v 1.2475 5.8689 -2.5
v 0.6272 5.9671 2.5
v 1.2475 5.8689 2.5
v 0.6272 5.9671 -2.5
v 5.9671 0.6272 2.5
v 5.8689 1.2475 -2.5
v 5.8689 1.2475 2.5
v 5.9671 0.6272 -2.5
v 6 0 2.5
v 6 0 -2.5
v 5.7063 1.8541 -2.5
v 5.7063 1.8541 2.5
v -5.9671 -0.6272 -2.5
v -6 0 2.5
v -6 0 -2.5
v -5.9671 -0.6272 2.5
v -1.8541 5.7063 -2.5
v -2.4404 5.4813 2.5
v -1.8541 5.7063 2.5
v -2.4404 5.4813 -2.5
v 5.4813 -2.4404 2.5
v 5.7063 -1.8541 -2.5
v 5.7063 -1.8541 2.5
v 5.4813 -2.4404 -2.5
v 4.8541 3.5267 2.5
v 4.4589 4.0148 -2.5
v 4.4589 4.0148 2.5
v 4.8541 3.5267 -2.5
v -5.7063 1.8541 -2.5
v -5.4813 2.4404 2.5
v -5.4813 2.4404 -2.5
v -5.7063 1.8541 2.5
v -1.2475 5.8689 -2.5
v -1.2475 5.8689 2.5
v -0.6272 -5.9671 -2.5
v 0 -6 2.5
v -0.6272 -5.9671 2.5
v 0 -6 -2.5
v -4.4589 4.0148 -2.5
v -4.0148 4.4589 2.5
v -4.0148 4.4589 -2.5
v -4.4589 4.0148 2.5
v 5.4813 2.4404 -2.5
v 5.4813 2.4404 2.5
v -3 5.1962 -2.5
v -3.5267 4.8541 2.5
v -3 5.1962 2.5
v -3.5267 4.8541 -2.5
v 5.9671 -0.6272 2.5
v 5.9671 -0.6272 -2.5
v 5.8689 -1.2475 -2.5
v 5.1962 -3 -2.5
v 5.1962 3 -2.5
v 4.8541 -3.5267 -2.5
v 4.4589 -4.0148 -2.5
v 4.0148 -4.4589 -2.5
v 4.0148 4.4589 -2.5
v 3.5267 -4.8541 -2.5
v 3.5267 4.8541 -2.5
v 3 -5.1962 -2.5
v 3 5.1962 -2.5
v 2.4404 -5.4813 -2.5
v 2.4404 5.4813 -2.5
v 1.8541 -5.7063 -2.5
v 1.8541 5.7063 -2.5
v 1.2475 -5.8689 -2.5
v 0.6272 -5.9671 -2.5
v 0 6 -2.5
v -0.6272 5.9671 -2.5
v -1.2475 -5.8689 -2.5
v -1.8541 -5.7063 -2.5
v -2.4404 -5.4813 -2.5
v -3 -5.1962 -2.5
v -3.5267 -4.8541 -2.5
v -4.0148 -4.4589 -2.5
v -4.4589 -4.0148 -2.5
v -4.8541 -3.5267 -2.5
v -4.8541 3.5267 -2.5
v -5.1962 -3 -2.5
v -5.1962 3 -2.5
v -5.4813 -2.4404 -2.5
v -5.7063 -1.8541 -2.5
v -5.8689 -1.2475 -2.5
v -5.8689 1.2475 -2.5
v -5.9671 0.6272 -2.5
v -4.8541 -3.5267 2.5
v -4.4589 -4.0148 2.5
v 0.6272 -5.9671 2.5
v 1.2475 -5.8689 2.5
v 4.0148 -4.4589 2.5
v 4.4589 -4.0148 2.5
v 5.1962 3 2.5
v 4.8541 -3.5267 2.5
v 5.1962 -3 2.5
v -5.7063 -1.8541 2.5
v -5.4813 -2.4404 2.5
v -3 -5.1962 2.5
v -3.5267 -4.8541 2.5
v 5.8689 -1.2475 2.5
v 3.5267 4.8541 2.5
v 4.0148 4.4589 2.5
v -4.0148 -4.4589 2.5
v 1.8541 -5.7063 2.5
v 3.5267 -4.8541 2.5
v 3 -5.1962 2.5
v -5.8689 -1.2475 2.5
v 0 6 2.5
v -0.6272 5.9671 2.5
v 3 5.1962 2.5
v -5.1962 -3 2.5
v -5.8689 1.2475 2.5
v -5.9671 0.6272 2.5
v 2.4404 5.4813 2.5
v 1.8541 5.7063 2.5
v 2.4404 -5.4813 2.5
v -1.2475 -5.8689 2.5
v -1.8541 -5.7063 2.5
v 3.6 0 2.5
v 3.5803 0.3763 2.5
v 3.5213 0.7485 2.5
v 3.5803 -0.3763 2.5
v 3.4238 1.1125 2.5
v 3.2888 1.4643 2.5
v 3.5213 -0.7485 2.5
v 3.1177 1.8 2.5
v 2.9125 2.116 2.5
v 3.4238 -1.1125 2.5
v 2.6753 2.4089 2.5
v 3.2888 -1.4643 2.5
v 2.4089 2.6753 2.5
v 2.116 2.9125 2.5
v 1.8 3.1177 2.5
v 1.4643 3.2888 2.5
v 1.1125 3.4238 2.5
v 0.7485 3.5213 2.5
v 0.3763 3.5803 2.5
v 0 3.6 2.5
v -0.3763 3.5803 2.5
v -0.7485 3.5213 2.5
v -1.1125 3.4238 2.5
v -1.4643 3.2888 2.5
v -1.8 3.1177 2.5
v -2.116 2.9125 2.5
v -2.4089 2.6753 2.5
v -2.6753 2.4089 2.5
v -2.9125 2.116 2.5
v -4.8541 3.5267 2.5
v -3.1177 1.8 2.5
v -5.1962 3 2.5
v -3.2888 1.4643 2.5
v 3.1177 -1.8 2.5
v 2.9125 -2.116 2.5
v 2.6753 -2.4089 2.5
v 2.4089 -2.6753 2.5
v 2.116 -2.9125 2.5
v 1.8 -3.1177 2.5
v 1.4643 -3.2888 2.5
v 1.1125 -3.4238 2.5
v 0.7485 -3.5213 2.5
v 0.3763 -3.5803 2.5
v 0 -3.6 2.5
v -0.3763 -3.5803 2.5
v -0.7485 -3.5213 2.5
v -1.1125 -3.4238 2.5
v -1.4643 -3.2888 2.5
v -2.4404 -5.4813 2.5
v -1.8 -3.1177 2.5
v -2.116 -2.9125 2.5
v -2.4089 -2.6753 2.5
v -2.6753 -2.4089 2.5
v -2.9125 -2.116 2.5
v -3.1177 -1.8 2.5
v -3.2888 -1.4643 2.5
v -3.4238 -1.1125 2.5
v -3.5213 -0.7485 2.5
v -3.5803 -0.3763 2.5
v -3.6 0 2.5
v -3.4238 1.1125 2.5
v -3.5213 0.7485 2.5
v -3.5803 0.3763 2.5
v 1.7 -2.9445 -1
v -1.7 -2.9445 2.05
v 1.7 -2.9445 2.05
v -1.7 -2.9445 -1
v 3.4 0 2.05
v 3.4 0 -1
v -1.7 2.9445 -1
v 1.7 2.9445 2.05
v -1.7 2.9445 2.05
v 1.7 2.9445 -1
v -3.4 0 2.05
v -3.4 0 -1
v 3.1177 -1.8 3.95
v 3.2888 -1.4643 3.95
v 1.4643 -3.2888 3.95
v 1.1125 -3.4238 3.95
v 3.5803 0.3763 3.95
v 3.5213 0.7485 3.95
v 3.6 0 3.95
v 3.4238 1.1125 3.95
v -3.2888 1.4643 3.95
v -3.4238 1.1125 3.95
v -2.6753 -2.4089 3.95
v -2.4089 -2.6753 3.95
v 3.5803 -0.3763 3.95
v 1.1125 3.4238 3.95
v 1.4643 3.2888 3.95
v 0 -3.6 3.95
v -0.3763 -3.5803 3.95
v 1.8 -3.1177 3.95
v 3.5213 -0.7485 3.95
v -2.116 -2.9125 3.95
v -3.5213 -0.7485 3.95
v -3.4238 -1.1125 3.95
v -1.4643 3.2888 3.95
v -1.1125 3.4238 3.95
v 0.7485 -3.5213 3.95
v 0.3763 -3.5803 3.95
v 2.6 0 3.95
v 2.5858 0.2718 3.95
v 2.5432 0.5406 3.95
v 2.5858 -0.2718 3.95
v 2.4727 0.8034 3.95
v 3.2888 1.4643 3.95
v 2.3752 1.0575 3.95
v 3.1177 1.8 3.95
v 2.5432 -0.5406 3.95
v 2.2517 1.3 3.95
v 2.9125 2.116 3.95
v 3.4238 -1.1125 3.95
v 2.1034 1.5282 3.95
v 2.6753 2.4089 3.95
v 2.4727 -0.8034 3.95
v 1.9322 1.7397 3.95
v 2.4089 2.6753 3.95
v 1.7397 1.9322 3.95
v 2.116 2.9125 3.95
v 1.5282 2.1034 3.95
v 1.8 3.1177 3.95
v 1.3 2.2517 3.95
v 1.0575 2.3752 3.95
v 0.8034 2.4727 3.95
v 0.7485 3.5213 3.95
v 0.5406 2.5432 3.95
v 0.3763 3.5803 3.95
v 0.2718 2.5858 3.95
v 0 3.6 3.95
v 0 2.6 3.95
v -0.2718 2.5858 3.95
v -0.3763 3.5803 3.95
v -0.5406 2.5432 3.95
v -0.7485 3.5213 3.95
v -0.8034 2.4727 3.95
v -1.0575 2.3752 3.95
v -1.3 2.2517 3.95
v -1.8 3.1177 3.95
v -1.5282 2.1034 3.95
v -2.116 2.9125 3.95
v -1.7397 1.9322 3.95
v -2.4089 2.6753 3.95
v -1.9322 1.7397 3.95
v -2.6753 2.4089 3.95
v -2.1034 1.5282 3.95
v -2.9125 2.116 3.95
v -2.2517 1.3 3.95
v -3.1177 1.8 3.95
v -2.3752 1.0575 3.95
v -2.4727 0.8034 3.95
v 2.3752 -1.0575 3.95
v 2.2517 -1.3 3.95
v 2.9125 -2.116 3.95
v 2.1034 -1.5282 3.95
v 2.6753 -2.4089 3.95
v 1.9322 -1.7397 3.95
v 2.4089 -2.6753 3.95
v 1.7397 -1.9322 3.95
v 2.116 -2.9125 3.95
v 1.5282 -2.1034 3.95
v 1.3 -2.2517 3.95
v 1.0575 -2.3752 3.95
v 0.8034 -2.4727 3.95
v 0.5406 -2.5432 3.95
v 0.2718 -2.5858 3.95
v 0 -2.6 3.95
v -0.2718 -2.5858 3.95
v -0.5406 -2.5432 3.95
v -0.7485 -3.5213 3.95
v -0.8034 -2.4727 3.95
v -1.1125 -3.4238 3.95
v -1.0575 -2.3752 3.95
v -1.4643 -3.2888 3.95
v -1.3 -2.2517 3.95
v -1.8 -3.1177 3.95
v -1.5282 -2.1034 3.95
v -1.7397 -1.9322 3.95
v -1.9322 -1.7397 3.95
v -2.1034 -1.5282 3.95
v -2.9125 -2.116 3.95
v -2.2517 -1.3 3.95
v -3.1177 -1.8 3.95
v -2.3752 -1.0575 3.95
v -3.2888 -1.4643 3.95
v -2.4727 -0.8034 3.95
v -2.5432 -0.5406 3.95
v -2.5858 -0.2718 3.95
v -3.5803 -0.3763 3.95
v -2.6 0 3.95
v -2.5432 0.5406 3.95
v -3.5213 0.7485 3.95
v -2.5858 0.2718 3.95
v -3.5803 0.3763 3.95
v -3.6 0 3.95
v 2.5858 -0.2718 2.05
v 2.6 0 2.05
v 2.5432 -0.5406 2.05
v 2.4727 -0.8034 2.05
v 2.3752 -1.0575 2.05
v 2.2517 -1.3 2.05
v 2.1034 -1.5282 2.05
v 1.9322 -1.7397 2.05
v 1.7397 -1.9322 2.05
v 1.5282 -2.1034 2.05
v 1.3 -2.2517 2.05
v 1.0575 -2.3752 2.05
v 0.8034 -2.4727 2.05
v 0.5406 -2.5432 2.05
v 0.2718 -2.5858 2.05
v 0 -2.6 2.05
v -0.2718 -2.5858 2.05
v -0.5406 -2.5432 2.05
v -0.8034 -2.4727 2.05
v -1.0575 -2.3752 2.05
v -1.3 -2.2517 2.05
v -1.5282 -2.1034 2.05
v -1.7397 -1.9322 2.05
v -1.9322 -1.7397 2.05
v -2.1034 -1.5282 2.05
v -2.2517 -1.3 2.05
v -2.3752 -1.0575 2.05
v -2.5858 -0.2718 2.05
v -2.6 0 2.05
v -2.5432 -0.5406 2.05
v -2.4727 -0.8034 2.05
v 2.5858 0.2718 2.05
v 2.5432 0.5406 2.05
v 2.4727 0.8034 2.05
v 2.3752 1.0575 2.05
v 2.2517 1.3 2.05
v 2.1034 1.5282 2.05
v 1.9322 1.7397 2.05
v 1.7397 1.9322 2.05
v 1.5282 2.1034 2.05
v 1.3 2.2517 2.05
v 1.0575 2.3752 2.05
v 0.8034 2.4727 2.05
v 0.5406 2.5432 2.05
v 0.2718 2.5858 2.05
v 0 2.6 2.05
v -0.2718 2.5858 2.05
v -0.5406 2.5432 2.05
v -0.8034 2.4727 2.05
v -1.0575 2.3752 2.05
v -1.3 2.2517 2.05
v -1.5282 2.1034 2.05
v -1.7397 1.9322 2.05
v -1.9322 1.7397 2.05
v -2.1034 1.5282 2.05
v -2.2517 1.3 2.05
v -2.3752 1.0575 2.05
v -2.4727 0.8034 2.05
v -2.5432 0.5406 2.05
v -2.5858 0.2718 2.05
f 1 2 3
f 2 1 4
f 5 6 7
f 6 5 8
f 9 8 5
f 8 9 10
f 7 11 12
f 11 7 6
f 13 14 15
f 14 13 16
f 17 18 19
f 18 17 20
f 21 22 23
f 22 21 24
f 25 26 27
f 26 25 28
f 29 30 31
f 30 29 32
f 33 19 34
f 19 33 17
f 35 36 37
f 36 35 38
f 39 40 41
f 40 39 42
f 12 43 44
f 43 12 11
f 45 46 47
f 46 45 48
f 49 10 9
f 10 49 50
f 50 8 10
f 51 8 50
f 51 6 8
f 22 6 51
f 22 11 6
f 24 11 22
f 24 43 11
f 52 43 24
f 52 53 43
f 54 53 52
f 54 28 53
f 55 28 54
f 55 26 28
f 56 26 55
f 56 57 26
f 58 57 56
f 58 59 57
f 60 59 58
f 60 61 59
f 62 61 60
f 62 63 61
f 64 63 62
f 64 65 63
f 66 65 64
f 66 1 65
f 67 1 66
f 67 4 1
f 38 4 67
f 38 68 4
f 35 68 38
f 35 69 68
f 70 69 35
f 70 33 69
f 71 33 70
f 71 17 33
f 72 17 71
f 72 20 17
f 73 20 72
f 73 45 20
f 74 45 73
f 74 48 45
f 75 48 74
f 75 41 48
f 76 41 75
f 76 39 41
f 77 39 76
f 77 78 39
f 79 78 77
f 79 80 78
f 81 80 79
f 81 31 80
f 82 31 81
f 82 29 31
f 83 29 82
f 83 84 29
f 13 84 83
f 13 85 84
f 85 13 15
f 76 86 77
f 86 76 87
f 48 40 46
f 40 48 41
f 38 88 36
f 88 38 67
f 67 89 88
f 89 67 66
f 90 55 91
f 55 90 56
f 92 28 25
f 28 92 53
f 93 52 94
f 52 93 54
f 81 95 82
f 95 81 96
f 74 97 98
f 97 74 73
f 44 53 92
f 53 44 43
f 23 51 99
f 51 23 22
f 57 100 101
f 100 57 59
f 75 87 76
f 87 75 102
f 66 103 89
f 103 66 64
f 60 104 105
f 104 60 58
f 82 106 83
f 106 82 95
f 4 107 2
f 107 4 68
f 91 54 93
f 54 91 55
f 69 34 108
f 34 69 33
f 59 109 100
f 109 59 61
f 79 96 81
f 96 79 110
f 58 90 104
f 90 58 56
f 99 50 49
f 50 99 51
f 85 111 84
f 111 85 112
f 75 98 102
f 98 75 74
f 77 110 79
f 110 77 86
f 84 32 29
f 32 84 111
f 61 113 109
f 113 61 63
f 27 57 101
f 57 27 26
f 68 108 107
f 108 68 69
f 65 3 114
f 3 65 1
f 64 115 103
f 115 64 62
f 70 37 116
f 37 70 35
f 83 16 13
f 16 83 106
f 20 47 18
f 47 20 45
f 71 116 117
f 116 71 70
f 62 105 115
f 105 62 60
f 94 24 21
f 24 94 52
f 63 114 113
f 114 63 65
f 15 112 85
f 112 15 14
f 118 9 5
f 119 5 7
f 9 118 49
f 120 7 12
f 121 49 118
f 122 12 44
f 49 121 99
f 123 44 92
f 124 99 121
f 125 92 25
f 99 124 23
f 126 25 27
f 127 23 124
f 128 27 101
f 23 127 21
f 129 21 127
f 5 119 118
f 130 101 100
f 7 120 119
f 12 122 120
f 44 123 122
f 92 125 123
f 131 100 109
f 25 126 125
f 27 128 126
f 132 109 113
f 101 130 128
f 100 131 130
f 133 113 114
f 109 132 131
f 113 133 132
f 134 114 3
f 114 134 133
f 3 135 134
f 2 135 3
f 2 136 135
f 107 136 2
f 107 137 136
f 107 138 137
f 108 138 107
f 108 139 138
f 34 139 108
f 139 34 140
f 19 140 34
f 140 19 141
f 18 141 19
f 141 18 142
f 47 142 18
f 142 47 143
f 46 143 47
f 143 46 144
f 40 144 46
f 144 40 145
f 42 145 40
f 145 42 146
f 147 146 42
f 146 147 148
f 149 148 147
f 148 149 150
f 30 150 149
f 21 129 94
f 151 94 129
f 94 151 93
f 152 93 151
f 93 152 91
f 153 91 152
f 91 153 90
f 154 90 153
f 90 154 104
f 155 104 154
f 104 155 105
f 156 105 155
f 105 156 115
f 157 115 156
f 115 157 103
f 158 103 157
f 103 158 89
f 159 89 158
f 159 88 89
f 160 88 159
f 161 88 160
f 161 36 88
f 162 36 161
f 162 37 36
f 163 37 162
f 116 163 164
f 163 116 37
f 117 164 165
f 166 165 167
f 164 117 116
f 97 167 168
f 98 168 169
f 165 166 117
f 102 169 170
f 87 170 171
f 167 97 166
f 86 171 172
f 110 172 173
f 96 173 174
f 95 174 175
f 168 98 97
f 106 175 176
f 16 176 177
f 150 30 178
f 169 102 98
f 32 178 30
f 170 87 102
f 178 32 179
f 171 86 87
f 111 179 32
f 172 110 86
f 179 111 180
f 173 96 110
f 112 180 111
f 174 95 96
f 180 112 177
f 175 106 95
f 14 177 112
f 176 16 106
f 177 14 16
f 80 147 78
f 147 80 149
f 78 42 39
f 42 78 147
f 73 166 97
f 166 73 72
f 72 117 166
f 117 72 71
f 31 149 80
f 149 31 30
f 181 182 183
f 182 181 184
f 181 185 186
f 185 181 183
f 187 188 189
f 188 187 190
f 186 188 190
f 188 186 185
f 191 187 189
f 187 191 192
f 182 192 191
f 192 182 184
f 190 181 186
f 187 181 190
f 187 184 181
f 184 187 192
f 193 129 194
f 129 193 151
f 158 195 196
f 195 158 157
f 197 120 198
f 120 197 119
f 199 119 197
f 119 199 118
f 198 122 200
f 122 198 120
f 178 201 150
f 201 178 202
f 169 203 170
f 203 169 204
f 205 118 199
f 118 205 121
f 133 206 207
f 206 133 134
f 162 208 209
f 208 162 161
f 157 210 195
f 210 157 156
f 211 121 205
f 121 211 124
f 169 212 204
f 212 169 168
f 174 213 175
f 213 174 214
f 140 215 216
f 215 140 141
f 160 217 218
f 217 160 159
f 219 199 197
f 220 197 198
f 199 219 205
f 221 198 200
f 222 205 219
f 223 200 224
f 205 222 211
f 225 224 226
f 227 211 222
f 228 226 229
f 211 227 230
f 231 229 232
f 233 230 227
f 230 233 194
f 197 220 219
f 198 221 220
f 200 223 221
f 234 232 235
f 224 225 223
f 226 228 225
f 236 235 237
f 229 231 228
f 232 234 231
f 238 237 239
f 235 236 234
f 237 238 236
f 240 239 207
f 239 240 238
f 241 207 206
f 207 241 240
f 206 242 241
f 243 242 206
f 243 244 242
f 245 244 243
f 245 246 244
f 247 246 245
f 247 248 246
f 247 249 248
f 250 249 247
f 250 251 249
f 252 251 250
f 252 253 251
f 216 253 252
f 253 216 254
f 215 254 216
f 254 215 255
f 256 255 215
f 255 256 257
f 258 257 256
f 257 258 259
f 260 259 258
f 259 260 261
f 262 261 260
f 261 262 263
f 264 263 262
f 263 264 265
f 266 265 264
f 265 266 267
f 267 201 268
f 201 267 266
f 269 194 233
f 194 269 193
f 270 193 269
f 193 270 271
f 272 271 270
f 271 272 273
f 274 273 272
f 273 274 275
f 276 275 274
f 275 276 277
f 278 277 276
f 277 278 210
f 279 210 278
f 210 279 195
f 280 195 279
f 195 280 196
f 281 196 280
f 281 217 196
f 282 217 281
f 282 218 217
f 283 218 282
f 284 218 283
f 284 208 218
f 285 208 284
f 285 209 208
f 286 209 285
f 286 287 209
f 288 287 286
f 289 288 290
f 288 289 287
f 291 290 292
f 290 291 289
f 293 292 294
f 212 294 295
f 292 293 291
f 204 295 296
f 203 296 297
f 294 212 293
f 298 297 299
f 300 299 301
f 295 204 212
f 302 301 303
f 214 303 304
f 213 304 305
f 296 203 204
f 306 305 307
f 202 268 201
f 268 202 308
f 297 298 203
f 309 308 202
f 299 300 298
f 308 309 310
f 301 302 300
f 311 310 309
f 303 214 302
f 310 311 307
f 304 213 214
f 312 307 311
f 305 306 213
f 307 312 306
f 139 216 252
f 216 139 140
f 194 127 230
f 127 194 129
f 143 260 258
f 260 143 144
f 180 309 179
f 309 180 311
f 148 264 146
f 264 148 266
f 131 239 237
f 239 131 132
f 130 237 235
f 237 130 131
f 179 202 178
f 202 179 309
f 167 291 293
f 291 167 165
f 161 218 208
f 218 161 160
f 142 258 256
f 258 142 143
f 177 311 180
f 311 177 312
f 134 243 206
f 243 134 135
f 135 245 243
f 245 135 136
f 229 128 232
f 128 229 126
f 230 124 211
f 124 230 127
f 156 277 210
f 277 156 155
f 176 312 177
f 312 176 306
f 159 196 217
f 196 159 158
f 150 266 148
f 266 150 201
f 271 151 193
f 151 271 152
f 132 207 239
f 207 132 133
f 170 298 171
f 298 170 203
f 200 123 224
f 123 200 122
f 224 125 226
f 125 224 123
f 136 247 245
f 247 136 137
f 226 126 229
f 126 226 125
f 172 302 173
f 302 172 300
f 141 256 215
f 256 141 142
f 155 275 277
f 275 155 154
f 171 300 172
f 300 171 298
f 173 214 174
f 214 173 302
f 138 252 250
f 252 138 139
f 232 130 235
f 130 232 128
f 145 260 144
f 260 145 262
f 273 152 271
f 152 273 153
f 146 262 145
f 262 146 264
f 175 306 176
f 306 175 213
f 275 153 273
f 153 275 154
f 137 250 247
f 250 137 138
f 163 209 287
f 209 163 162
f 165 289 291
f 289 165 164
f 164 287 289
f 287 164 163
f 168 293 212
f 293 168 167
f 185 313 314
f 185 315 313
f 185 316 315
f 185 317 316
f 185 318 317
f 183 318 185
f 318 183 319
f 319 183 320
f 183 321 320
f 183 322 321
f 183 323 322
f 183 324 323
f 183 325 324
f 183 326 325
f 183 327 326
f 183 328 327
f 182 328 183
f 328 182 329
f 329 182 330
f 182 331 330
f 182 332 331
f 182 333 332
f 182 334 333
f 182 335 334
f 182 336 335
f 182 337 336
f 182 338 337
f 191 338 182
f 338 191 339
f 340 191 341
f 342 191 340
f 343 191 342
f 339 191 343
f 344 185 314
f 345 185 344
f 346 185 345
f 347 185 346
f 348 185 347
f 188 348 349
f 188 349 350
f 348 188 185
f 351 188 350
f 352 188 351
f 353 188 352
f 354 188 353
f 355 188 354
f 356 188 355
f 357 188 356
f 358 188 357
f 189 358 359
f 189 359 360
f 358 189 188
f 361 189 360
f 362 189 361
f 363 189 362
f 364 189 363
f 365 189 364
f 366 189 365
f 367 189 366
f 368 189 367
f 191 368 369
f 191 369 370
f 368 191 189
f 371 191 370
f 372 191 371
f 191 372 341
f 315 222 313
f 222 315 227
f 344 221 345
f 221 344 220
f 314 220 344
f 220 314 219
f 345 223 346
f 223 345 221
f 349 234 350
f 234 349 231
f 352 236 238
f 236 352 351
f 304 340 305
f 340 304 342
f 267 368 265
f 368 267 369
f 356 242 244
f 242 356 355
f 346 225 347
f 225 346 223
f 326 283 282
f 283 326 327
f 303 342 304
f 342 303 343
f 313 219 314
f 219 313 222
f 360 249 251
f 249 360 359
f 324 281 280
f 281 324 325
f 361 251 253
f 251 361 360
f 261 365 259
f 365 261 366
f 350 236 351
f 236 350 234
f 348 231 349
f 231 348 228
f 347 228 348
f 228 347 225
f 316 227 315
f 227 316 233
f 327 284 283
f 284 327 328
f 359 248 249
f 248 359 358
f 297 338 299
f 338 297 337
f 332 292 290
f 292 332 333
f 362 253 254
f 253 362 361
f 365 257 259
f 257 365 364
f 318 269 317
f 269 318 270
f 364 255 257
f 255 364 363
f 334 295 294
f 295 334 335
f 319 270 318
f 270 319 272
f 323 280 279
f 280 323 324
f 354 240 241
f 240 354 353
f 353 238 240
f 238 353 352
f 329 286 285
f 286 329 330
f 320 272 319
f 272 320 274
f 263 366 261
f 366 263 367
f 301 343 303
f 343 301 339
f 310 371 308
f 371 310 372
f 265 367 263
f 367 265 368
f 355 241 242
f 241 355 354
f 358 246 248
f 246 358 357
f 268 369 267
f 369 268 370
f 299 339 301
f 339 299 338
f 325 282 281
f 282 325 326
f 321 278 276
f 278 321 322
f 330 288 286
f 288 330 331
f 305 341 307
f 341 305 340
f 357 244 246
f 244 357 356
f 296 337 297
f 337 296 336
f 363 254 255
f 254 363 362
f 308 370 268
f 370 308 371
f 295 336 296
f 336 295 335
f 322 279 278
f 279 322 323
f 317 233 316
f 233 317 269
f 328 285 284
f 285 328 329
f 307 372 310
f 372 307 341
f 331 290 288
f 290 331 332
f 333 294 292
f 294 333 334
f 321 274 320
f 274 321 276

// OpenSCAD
module hex(){
$fn = 6;
//difference()
//{
  //  cube([10, 10,5], true);
    translate([0,0,0]) cylinder(6, 3.4,3.4);
//}
}
$fn = 60;

difference(){
cylinder(5, 6,6, true);
translate([0,0,-1]) hex(); 
}
translate([0,0,3]) difference(){
    
    cylinder(1.9, 3.6,3.6, true);
    cylinder(2, 2.6,2.6, true);
    }
